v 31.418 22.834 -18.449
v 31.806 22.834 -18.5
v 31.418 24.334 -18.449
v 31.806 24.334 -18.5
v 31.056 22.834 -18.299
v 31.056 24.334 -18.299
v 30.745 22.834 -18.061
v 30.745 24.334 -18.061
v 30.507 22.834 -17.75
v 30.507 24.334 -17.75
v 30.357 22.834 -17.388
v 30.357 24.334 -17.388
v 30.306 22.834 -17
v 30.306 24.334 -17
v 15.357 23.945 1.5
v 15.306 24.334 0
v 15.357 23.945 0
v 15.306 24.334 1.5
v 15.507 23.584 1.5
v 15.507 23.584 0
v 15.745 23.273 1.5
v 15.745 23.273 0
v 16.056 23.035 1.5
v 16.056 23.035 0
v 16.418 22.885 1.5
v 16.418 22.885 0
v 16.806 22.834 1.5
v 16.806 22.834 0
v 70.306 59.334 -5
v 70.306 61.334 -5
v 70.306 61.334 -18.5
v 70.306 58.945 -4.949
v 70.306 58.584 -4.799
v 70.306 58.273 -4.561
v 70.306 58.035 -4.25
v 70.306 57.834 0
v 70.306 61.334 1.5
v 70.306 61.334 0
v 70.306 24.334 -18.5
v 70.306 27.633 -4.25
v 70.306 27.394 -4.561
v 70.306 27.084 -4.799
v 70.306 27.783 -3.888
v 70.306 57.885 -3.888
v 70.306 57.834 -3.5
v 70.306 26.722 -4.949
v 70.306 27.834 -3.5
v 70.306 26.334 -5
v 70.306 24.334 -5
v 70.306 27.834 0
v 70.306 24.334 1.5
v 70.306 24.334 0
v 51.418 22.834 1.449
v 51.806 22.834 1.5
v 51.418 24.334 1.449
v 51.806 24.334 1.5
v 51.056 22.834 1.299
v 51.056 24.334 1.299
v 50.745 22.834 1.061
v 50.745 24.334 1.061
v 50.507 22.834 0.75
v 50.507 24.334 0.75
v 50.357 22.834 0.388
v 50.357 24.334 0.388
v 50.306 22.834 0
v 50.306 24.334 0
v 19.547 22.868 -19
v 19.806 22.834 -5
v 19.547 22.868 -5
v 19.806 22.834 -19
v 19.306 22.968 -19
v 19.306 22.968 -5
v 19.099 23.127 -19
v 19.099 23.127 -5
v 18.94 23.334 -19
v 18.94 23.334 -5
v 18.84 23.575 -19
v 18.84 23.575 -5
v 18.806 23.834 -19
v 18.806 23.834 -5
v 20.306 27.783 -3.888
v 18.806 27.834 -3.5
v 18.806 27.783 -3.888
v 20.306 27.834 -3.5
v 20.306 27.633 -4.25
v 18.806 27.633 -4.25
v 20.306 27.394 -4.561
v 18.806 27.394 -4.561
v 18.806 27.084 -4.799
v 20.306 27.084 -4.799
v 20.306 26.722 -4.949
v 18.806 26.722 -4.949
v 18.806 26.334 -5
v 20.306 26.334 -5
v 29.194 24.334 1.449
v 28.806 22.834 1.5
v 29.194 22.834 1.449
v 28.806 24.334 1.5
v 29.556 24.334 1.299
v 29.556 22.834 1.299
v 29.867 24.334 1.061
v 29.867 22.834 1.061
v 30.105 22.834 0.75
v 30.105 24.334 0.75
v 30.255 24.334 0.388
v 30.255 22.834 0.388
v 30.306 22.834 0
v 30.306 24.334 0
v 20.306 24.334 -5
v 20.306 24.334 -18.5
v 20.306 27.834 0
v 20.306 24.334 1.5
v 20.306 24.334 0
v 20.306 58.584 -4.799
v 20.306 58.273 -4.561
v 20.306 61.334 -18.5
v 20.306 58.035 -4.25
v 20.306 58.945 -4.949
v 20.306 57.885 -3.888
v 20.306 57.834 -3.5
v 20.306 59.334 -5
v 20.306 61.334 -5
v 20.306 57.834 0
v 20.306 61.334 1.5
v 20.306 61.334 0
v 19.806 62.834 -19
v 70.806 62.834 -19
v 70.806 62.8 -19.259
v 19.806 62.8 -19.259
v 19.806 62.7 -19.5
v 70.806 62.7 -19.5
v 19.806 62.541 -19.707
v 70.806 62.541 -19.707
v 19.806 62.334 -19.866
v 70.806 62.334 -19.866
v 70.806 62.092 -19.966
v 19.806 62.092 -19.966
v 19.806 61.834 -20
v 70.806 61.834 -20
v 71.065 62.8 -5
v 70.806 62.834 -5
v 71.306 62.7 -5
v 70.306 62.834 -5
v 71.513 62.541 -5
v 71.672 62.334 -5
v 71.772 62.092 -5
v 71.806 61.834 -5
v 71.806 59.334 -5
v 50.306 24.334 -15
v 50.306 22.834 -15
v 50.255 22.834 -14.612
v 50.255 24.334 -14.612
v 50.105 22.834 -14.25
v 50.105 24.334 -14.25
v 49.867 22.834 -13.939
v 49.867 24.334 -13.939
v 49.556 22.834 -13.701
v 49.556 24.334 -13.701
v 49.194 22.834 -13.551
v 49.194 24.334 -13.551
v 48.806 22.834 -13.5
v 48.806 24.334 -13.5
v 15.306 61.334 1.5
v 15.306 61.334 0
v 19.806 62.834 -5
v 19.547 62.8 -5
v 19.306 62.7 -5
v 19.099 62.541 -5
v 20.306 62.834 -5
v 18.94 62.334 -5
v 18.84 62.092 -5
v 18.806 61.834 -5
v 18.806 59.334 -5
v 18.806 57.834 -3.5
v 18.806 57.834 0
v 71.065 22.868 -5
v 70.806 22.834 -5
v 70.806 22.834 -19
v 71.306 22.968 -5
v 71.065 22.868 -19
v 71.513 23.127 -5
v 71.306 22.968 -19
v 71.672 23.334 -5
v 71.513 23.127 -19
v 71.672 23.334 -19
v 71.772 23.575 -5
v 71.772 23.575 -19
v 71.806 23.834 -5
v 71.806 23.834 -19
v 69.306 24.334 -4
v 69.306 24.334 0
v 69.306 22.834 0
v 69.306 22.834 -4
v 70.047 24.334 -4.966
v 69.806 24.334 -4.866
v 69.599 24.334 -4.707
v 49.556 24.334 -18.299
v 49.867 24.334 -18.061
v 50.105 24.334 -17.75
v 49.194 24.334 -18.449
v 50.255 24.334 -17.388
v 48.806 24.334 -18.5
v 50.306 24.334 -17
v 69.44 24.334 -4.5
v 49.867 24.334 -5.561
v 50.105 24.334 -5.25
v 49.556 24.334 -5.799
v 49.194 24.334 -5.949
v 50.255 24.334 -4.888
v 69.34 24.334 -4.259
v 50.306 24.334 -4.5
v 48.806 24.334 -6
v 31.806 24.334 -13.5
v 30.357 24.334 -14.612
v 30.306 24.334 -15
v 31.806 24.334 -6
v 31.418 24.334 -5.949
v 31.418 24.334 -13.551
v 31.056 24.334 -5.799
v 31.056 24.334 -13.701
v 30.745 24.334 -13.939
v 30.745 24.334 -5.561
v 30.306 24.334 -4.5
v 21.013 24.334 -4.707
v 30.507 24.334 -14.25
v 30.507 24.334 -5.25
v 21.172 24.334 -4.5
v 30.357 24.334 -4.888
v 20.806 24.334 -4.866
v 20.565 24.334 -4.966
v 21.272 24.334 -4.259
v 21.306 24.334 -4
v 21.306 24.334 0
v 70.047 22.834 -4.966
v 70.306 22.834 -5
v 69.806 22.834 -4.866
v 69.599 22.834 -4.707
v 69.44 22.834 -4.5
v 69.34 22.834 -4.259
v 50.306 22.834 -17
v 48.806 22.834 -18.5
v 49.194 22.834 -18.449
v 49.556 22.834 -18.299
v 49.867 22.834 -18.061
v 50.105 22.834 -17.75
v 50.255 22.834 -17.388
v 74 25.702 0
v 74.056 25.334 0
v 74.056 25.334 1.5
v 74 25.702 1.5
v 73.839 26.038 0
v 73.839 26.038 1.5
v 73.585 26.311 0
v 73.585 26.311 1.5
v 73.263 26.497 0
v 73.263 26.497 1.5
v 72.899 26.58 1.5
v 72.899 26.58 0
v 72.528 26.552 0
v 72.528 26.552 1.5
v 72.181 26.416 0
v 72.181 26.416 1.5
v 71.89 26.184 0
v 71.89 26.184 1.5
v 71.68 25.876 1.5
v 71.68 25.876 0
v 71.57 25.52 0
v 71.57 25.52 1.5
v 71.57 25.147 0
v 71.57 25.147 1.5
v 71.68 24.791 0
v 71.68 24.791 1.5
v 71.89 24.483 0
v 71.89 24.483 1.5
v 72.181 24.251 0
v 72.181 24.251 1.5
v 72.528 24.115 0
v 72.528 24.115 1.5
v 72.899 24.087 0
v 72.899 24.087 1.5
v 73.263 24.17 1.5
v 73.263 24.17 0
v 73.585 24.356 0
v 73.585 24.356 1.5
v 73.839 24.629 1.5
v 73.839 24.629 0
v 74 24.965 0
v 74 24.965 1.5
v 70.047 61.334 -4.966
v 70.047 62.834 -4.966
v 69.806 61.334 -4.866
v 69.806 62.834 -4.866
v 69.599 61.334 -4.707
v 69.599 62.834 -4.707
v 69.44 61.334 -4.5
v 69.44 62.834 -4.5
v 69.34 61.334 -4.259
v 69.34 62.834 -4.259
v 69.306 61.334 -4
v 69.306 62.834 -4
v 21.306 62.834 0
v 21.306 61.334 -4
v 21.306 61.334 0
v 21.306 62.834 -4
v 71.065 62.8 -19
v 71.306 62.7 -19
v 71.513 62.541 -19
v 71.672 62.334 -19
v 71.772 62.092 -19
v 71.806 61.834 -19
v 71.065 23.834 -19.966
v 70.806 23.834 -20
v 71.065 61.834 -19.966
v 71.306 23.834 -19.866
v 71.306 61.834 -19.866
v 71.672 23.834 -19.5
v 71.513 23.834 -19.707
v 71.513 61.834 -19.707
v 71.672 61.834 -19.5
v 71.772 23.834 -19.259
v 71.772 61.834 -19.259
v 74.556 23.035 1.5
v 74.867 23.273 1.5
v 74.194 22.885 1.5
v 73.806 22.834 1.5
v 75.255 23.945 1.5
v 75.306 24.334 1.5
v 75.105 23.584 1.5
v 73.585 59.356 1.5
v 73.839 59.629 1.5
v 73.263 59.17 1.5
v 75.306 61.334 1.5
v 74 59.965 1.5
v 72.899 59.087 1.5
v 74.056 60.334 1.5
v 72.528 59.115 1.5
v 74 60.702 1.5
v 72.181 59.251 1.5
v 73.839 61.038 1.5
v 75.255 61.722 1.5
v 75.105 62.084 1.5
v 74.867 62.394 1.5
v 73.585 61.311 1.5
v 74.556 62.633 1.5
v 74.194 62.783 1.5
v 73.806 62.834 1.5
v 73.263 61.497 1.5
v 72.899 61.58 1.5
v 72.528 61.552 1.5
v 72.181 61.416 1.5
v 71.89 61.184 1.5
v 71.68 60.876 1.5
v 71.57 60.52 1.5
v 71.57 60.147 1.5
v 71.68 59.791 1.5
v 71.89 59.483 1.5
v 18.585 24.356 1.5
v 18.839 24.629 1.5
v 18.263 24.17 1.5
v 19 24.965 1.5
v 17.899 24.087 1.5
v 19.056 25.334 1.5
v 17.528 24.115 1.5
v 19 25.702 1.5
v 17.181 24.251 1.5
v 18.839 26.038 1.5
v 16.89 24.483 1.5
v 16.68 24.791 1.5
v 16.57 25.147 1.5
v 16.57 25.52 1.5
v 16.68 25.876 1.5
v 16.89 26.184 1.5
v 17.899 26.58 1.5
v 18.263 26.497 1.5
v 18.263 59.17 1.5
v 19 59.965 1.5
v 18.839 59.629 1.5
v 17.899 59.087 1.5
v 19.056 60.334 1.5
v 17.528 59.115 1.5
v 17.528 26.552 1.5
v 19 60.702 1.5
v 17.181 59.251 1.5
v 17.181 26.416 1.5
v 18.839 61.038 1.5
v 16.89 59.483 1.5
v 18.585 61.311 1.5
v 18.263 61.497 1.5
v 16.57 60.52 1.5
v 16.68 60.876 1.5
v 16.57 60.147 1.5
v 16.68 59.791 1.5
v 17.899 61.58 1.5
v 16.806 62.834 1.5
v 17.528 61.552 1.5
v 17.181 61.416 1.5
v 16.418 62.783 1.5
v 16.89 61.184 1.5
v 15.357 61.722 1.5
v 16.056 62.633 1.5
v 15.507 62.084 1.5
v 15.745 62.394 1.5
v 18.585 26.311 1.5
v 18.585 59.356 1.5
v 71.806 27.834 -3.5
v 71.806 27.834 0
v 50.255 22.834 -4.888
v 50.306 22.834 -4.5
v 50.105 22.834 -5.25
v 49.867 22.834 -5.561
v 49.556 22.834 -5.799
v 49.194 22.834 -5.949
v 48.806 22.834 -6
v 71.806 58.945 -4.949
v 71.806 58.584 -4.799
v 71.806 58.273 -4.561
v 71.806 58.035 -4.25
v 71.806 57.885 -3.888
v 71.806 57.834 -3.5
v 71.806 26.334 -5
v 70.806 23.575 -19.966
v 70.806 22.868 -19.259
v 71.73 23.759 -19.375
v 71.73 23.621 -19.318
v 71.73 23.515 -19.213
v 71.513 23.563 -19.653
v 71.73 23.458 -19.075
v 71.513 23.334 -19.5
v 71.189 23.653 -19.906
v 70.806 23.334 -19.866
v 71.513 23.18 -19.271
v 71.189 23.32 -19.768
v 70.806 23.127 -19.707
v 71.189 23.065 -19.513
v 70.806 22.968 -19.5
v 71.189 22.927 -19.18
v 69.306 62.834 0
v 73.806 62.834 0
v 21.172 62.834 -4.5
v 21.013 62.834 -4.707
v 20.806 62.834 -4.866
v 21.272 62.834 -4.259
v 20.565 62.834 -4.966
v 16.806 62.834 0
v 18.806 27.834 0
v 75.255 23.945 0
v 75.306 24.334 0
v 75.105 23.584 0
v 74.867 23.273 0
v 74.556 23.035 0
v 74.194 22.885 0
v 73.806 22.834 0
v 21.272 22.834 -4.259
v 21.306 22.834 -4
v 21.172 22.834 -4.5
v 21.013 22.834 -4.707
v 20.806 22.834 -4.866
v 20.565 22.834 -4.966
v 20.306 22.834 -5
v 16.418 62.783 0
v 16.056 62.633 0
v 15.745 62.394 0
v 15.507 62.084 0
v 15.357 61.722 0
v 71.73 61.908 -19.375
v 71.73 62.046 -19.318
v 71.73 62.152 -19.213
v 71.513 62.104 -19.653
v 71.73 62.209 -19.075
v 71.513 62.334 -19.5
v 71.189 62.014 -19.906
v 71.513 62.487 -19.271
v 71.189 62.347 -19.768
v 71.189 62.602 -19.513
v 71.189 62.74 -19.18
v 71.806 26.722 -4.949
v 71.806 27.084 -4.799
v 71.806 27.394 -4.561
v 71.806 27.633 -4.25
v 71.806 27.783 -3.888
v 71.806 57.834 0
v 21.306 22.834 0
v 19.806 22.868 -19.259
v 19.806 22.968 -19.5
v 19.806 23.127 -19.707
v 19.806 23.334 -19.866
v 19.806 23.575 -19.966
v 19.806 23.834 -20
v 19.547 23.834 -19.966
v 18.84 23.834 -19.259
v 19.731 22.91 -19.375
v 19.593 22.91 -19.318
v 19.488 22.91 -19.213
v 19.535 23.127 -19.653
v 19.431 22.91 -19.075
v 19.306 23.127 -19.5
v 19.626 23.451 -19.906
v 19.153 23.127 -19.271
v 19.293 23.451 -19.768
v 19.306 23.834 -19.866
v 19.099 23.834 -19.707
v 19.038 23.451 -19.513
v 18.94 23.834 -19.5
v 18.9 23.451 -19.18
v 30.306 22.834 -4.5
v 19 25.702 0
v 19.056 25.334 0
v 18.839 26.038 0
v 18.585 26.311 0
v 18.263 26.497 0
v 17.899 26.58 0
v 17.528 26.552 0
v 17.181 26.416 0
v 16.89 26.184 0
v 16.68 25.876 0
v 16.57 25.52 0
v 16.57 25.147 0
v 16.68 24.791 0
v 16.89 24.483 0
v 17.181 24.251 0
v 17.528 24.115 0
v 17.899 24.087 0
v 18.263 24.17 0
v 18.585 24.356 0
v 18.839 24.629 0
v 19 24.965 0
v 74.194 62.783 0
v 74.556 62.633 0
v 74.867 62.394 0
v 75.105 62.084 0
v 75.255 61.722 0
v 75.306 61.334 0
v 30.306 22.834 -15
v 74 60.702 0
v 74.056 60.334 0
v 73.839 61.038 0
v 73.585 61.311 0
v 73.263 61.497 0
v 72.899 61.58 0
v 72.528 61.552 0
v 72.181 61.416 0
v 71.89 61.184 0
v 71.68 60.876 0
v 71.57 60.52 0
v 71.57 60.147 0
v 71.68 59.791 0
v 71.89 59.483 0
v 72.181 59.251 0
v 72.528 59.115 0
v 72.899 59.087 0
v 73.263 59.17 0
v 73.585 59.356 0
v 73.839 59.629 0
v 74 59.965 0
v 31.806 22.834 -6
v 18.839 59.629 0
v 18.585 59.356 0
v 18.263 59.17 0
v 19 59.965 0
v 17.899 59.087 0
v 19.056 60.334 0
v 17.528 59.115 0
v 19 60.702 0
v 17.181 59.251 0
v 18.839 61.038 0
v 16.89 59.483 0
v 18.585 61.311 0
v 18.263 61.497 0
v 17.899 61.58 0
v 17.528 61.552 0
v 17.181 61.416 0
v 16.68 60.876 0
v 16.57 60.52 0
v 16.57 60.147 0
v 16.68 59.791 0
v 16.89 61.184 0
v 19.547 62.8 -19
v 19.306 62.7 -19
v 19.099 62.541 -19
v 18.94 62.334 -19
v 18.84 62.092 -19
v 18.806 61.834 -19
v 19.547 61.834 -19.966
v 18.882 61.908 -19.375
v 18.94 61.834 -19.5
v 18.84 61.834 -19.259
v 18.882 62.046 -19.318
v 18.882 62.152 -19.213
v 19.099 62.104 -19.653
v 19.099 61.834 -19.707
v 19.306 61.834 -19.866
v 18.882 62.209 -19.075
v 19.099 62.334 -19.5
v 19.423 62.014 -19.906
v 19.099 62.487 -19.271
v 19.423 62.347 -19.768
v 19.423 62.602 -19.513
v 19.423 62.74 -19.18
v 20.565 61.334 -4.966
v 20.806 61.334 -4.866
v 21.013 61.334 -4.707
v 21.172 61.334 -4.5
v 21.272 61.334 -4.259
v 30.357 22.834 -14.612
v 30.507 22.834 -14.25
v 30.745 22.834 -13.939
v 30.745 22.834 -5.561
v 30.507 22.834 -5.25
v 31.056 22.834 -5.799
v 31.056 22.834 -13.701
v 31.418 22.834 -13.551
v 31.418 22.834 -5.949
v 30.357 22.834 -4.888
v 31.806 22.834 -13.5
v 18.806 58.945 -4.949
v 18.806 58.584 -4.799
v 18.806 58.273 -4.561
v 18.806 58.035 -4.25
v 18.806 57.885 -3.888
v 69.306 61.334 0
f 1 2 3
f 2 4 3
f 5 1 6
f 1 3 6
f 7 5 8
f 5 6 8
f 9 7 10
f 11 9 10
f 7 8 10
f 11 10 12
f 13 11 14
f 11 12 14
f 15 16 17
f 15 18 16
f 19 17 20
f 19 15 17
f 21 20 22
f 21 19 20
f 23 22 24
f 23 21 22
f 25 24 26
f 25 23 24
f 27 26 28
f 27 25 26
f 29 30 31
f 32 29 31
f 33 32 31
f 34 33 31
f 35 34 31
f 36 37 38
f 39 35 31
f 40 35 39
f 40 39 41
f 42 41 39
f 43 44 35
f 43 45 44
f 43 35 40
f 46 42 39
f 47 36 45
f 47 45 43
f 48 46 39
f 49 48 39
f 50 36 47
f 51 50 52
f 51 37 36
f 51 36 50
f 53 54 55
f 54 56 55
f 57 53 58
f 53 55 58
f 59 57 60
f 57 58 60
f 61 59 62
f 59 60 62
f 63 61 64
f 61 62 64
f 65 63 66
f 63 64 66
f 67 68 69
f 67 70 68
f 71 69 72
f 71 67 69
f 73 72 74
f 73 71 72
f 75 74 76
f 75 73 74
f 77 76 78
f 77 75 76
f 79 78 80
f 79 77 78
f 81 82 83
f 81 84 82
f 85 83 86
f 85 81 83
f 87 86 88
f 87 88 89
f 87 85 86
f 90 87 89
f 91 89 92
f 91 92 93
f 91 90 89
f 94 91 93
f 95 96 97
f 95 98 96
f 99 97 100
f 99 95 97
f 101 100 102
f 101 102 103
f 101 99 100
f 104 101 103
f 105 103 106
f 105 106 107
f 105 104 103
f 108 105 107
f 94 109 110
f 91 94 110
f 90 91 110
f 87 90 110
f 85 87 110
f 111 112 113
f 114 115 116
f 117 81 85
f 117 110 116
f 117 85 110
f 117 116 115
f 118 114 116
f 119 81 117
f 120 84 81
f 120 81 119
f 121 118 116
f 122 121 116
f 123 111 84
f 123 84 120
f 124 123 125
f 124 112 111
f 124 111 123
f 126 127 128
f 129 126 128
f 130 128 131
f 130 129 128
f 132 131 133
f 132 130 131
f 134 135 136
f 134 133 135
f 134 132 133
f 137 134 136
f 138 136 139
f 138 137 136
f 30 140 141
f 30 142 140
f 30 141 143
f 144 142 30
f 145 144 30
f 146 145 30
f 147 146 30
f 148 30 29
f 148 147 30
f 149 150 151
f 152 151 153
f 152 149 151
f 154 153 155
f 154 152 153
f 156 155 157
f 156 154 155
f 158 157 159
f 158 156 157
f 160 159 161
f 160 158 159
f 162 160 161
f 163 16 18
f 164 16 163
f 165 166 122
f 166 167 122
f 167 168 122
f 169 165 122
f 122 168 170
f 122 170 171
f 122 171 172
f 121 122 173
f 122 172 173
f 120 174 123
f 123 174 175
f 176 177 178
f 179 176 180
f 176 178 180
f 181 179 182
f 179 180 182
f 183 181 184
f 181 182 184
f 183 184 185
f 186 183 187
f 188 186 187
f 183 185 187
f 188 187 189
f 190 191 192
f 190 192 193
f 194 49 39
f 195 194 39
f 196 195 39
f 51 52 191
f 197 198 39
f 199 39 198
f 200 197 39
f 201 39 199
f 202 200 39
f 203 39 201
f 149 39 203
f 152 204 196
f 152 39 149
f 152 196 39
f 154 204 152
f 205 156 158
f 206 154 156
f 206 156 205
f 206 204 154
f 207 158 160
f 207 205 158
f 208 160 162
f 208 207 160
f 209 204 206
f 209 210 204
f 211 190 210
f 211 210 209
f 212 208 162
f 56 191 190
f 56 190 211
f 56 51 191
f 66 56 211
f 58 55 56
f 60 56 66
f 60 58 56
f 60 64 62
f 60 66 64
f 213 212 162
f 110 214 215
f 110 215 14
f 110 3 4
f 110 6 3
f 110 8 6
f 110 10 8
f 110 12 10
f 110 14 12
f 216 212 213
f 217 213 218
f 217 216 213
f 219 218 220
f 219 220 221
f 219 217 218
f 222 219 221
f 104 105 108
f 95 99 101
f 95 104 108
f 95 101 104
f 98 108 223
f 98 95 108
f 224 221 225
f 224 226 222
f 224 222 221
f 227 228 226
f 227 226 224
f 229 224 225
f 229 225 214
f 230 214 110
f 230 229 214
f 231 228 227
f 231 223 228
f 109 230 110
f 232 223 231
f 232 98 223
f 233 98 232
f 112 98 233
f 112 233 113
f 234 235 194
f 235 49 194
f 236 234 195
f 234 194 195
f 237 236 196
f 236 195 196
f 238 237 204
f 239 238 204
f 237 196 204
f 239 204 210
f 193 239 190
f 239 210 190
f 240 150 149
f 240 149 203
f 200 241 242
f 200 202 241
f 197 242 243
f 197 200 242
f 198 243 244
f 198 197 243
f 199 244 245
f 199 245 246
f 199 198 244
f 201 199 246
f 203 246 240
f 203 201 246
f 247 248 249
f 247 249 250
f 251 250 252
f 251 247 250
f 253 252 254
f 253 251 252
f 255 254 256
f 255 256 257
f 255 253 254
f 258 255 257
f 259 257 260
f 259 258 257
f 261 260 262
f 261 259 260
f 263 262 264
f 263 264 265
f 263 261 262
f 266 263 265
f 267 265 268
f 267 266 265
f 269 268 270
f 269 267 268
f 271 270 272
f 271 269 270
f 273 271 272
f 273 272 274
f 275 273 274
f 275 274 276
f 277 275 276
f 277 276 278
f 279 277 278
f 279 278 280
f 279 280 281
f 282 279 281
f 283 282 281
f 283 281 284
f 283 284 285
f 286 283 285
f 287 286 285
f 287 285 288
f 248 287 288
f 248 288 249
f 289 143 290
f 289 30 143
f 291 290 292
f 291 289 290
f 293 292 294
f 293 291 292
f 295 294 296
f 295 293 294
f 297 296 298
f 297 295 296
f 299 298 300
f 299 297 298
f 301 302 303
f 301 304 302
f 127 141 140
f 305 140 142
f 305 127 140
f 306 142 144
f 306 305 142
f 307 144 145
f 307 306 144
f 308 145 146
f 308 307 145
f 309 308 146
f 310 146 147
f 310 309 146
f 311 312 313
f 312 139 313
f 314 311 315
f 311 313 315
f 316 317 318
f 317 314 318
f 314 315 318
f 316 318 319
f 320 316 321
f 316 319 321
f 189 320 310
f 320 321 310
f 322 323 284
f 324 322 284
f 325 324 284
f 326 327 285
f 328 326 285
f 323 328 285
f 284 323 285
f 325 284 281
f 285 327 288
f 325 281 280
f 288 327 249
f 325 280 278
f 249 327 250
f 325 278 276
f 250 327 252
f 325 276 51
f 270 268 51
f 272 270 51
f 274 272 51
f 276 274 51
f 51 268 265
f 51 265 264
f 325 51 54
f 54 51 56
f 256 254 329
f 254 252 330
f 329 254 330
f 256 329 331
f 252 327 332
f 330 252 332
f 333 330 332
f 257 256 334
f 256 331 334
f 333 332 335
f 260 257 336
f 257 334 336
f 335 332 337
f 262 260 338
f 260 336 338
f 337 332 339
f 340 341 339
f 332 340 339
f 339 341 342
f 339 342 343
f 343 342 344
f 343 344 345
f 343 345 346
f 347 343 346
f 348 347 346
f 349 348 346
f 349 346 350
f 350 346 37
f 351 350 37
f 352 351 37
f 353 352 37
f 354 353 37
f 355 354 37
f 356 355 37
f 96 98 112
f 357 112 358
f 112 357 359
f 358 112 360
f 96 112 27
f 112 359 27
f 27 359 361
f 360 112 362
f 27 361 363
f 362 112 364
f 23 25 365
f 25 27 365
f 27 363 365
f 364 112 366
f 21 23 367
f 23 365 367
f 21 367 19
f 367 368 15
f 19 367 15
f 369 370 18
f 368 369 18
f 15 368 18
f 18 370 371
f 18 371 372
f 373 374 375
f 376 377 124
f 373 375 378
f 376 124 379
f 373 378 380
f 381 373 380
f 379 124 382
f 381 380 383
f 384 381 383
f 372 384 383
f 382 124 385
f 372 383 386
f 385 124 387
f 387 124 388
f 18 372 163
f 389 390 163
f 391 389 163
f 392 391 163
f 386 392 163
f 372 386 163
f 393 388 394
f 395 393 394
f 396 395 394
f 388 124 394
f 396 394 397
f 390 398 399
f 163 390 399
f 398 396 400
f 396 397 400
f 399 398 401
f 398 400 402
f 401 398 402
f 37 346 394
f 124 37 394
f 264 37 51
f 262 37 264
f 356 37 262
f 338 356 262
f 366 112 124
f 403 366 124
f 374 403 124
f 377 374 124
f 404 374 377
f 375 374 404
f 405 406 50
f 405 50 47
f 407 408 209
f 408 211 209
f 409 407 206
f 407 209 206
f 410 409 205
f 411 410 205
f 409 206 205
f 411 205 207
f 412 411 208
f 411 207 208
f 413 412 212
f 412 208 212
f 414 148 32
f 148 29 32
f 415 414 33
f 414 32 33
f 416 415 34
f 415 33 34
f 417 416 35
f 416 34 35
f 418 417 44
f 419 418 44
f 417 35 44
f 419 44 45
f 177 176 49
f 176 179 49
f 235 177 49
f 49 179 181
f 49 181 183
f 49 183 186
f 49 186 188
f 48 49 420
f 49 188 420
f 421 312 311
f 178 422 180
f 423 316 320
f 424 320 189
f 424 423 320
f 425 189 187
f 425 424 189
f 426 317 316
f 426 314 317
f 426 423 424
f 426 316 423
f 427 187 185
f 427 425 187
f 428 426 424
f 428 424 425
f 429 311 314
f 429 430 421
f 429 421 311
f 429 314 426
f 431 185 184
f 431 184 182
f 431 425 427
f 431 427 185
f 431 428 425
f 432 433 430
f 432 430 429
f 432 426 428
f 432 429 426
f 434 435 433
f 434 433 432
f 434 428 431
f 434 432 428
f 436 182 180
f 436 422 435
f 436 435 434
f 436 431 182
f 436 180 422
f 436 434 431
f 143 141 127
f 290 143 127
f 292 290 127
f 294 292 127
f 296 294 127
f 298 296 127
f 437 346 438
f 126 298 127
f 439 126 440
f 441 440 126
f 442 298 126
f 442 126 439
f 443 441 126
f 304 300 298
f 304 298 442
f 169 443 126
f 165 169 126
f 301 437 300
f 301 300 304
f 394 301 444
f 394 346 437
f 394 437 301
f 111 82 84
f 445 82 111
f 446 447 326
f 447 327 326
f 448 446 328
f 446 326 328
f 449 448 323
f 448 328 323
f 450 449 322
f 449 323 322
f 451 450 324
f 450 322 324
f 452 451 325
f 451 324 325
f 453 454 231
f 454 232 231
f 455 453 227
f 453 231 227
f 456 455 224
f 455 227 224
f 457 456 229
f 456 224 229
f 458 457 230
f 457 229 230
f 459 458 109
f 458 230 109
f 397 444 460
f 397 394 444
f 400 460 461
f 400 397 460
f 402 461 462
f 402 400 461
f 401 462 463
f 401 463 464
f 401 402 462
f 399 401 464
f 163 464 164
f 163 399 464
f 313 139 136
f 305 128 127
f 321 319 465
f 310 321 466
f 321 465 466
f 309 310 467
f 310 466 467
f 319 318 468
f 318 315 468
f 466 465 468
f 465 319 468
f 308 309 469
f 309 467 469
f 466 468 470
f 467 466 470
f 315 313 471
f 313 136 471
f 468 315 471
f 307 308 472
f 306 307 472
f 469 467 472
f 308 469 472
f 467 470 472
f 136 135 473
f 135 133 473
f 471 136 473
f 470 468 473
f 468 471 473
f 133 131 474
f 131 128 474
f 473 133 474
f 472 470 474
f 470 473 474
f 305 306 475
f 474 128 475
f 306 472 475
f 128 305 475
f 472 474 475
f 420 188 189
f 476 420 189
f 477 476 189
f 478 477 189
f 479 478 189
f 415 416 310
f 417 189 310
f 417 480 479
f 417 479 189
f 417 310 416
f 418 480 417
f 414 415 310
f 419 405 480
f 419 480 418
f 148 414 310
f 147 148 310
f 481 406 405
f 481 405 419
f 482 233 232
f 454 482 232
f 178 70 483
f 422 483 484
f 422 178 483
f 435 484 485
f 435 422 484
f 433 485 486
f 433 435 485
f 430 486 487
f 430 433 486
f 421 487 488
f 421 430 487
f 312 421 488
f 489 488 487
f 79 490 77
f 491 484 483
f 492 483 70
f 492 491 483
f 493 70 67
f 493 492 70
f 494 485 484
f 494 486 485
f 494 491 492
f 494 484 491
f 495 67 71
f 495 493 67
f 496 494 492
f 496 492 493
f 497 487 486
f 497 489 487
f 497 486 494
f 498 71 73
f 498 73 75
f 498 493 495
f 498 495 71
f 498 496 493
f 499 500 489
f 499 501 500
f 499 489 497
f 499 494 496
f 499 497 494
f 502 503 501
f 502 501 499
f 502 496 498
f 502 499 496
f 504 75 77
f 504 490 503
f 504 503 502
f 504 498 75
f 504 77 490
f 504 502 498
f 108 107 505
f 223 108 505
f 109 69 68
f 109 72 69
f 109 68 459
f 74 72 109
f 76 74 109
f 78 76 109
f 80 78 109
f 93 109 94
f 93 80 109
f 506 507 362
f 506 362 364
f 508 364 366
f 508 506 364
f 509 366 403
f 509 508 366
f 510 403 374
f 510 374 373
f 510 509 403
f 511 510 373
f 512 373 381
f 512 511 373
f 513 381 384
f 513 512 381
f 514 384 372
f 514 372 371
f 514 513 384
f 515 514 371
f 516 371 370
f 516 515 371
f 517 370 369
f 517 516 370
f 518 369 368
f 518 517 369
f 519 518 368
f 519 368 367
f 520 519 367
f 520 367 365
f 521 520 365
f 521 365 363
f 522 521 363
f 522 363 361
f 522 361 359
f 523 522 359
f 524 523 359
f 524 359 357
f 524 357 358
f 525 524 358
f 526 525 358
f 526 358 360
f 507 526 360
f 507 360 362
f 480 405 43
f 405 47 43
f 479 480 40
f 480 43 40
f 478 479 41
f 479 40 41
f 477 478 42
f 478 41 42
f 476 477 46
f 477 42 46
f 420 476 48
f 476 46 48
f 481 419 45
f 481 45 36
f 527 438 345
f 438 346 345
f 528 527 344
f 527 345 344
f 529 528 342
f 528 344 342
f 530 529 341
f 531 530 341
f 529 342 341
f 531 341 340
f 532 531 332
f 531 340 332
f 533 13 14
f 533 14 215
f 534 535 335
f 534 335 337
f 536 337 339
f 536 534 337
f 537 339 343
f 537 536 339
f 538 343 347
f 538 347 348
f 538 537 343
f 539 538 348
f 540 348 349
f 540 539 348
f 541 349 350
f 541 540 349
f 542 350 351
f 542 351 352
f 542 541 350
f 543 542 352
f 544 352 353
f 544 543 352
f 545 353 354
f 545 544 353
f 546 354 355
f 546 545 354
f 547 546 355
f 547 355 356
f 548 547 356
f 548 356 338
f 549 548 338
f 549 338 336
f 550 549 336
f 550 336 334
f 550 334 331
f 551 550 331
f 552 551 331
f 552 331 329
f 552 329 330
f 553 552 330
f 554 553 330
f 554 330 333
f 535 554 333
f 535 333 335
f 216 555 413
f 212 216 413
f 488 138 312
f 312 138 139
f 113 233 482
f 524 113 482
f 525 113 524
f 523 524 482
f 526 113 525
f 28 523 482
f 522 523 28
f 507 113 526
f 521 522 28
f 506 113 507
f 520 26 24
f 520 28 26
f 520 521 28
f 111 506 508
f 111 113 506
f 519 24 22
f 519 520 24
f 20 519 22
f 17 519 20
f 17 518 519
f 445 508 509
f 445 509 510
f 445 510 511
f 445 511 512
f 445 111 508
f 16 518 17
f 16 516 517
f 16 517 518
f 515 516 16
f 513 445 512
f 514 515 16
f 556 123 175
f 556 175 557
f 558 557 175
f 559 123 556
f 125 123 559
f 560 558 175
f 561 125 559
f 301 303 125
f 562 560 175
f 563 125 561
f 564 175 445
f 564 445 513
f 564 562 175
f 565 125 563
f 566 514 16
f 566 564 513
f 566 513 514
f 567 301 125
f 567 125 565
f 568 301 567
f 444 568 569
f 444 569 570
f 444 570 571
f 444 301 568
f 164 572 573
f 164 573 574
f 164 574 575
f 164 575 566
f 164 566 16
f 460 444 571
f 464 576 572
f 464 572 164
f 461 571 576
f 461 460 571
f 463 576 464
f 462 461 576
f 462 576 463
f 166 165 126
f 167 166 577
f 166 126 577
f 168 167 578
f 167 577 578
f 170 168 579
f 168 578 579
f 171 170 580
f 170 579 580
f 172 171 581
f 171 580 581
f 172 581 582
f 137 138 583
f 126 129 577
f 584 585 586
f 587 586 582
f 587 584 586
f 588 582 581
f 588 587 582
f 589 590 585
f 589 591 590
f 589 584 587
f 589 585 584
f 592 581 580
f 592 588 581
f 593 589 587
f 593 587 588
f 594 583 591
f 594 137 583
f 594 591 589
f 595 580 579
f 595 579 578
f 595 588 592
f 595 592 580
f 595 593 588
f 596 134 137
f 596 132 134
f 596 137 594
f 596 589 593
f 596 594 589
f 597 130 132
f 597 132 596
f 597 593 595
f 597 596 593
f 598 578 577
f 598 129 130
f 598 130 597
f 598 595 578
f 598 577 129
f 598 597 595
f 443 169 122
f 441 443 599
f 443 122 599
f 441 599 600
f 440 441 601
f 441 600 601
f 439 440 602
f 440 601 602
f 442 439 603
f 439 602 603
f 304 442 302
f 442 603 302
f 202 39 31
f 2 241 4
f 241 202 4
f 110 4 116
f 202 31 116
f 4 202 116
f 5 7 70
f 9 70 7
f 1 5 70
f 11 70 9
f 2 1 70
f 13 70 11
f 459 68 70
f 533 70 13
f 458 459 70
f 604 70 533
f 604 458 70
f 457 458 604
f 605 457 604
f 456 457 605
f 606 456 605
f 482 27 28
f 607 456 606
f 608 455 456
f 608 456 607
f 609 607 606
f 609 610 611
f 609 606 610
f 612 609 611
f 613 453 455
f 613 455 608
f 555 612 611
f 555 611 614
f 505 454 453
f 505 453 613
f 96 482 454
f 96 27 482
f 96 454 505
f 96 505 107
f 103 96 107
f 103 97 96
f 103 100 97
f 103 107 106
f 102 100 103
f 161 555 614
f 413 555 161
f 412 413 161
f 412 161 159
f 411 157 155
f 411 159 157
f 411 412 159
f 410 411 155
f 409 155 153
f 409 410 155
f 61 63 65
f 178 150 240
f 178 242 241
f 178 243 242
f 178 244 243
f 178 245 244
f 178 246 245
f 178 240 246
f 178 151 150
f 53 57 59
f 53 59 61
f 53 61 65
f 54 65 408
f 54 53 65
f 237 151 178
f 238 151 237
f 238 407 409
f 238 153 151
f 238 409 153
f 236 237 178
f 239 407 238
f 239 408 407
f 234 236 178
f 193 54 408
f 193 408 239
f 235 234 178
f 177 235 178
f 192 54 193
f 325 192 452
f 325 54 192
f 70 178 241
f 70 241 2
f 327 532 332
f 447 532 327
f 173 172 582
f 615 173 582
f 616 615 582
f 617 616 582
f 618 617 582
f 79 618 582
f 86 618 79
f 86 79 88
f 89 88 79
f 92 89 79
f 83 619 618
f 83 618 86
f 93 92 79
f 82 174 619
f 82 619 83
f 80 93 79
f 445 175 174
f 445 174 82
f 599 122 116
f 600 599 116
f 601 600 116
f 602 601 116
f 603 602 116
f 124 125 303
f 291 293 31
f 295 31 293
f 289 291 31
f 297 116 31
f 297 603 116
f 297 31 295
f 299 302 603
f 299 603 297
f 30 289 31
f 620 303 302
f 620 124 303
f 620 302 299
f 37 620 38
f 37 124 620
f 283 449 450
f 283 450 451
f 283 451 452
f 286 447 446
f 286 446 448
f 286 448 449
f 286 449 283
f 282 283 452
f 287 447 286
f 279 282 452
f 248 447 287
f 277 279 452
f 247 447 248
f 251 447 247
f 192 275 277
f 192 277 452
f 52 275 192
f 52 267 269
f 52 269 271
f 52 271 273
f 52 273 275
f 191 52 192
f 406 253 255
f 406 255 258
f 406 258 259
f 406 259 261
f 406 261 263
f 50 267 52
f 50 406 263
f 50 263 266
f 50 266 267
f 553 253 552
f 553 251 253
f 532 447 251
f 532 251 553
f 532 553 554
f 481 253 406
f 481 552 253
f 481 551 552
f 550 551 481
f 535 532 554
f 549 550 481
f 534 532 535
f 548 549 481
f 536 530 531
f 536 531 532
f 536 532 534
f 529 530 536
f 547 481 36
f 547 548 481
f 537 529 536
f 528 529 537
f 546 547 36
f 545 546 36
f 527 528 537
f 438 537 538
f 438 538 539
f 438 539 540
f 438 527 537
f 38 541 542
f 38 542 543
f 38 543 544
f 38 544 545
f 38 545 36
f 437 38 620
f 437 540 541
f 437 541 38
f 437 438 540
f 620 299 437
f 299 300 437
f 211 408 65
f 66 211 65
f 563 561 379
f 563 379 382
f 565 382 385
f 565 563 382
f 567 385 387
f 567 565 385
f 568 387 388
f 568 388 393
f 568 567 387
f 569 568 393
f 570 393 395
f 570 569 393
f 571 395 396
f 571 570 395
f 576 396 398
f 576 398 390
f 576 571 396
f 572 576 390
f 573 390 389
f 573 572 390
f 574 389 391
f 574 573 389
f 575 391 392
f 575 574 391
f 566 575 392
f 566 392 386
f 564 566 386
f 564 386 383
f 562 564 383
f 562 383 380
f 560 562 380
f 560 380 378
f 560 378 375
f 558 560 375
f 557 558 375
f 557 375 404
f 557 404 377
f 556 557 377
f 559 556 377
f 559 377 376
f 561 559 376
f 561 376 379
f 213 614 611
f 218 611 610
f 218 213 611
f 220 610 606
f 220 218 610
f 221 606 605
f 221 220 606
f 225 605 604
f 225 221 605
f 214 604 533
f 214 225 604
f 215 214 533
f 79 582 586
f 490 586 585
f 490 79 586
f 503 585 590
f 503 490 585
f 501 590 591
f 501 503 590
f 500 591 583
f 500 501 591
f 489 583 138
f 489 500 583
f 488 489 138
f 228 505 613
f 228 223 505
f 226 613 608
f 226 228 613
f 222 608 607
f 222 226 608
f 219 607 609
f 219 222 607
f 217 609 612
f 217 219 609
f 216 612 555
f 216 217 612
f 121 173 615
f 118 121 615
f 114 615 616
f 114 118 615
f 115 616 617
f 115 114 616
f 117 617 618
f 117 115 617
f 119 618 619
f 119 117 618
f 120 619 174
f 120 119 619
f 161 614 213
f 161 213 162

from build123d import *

# Parameters (mm, degrees)
SKETCH2_R           = 1.2500000000000047
SKETCH2_R_2         = 1.2499999999999978
BOSS_EXTRUDE3_DEPTH = 1.5
BOSS_EXTRUDE4_DEPTH = 20
CUT_EXTRUDE4_DEPTH  = 20
CUT_EXTRUDE8_DEPTH  = 2.5
SKETCH12_W          = 5.000000000000005
SKETCH12_H          = 4.999999999999993
CUT_EXTRUDE9_DEPTH  = 2.5
CUT_EXTRUDE11_DEPTH = 5
FILLET6_R           = 1.5
FILLET7_R           = 1


with BuildPart() as part:
    # Sketch2 → Boss-Extrude3 (new body)
    with BuildSketch(Plane.XY):
        Polygon((15.305986754735851, 62.83362130987144), (75.30598675473586, 62.83362130987144), (75.30598675473586, 22.83362130987144), (15.305986754735857, 22.83362130987144), align=None)
        with Locations((17.80598675473585, 60.33362130987144)):
            Circle(SKETCH2_R, mode=Mode.SUBTRACT)
        with Locations((17.80598675473585, 25.333621309871436)):
            Circle(SKETCH2_R_2, mode=Mode.SUBTRACT)
        with Locations((72.80598675473584, 25.33362130987144)):
            Circle(SKETCH2_R_2, mode=Mode.SUBTRACT)
        with Locations((72.80598675473584, 60.33362130987144)):
            Circle(SKETCH2_R_2, mode=Mode.SUBTRACT)
    extrude(amount=BOSS_EXTRUDE3_DEPTH)

    # Sketch3 → Boss-Extrude4 (add)
    with BuildSketch(Plane(origin=(0, 0, 0), x_dir=(-1, 0, 0), z_dir=(0, 0, -1))):
        Polygon((-71.80598675473584, 62.83362130987144), (-18.805986754735855, 62.83362130987144), (-18.805986754735848, 22.83362130987144), (-71.80598675473584, 22.83362130987144), align=None)
    extrude(amount=BOSS_EXTRUDE4_DEPTH)

    # Sketch7 → Cut-Extrude4 (cut)
    with BuildSketch(Plane.XY.offset(1.5)):
        Polygon((20.30598675473585, 61.33362130987144), (70.30598675473584, 61.33362130987144), (70.30598675473584, 24.33362130987144), (20.305986754735855, 24.33362130987144), align=None)
    extrude(amount=-CUT_EXTRUDE4_DEPTH, mode=Mode.SUBTRACT)

    # Sketch11 → Cut-Extrude8 (cut)
    with BuildSketch(Plane.ZY.offset(-18.805986754735844)):
        Polygon((0, 62.83362130987144), (-5, 62.83362130987144), (-4.999999999999999, 57.83362130987144), (6.1e-16, 57.83362130987144), align=None)
        Polygon((0, 22.833621309871443), (-4.999999999999999, 22.833621309871443), (-4.999999999999996, 27.83362130987144), (0, 27.83362130987144), align=None)
    extrude(amount=-CUT_EXTRUDE8_DEPTH, mode=Mode.SUBTRACT)

    # Sketch12 → Cut-Extrude9 (cut)
    with BuildSketch(Plane(origin=(71.80598675473584, 0, 0), x_dir=(0, 0, -1), z_dir=(1, 0, 0))):
        Polygon((0, 62.83362130987144), (5, 62.83362130987144), (5.000000000000001, 57.83362130987144), (6.1e-16, 57.83362130987144), align=None)
        with Locations((2.5000000000000027, 25.333621309871436)):
            Rectangle(SKETCH12_W, SKETCH12_H)
    extrude(amount=-CUT_EXTRUDE9_DEPTH, mode=Mode.SUBTRACT)

    # Sketch15 → Cut-Extrude11 (cut)
    with BuildSketch(Plane.XZ.offset(-22.83362130987144)):
        Polygon((50.30598675473586, 1.5), (30.30598675473586, 1.4999999999999971), (30.30598675473586, -6.000000000000003), (50.30598675473586, -6), align=None)
        Polygon((50.30598675473587, -18.5), (30.305986754735855, -18.500000000000004), (30.30598675473586, -13.500000000000002), (50.30598675473587, -13.499999999999998), align=None)
    extrude(amount=-CUT_EXTRUDE11_DEPTH, mode=Mode.SUBTRACT)

    # Fillet6
    fillet6_edges = [part.edges().sort_by_distance(p)[0] for p in [
        (71.05598675473584, 57.83362130987144, -5.000000000000001),
        (71.05598675473584, 27.833621309871436, -5.000000000000005),
        (50.30598675473586, 23.58362130987144, 1.5),
        (50.30598675473586, 23.58362130987144, -6),
        (30.30598675473586, 23.58362130987144, -6.000000000000003),
        (30.30598675473586, 23.58362130987144, 1.4999999999999971),
        (50.30598675473587, 23.58362130987144, -18.5),
        (30.30598675473586, 23.58362130987144, -13.500000000000002),
        (50.30598675473587, 23.58362130987144, -13.499999999999998),
        (30.305986754735855, 23.58362130987144, -18.500000000000004),
        (15.305986754735851, 62.83362130987144, 0.75),
        (75.30598675473586, 62.83362130987144, 0.75),
        (75.30598675473586, 22.83362130987144, 0.75),
        (19.555986754735855, 57.83362130987144, -4.999999999999999),
        (15.305986754735857, 22.83362130987144, 0.75),
        (19.555986754735855, 27.833621309871436, -4.999999999999996),
    ]]
    fillet(fillet6_edges, radius=FILLET6_R)

    # Fillet7
    fillet7_edges = [part.edges().sort_by_distance(p)[0] for p in [
        (45.30598675473585, 62.83362130987144, -20),
        (18.80598675473585, 42.83362130987144, -20),
        (45.30598675473584, 22.83362130987144, -20),
        (71.80598675473584, 42.83362130987144, -20),
        (21.305986754735848, 23.58362130987144, -4.999999999999998),
        (69.30598675473584, 23.58362130987144, -5.000000000000005),
        (69.30598675473584, 62.08362130987144, -5),
        (21.305986754735855, 62.08362130987144, -5),
        (71.80598675473584, 62.83362130987144, -12.5),
        (18.805986754735855, 62.83362130987144, -12.5),
        (71.80598675473584, 22.83362130987144, -12.500000000000004),
        (18.805986754735848, 22.83362130987144, -12.5),
    ]]
    fillet(fillet7_edges, radius=FILLET7_R)


solid = part.part
